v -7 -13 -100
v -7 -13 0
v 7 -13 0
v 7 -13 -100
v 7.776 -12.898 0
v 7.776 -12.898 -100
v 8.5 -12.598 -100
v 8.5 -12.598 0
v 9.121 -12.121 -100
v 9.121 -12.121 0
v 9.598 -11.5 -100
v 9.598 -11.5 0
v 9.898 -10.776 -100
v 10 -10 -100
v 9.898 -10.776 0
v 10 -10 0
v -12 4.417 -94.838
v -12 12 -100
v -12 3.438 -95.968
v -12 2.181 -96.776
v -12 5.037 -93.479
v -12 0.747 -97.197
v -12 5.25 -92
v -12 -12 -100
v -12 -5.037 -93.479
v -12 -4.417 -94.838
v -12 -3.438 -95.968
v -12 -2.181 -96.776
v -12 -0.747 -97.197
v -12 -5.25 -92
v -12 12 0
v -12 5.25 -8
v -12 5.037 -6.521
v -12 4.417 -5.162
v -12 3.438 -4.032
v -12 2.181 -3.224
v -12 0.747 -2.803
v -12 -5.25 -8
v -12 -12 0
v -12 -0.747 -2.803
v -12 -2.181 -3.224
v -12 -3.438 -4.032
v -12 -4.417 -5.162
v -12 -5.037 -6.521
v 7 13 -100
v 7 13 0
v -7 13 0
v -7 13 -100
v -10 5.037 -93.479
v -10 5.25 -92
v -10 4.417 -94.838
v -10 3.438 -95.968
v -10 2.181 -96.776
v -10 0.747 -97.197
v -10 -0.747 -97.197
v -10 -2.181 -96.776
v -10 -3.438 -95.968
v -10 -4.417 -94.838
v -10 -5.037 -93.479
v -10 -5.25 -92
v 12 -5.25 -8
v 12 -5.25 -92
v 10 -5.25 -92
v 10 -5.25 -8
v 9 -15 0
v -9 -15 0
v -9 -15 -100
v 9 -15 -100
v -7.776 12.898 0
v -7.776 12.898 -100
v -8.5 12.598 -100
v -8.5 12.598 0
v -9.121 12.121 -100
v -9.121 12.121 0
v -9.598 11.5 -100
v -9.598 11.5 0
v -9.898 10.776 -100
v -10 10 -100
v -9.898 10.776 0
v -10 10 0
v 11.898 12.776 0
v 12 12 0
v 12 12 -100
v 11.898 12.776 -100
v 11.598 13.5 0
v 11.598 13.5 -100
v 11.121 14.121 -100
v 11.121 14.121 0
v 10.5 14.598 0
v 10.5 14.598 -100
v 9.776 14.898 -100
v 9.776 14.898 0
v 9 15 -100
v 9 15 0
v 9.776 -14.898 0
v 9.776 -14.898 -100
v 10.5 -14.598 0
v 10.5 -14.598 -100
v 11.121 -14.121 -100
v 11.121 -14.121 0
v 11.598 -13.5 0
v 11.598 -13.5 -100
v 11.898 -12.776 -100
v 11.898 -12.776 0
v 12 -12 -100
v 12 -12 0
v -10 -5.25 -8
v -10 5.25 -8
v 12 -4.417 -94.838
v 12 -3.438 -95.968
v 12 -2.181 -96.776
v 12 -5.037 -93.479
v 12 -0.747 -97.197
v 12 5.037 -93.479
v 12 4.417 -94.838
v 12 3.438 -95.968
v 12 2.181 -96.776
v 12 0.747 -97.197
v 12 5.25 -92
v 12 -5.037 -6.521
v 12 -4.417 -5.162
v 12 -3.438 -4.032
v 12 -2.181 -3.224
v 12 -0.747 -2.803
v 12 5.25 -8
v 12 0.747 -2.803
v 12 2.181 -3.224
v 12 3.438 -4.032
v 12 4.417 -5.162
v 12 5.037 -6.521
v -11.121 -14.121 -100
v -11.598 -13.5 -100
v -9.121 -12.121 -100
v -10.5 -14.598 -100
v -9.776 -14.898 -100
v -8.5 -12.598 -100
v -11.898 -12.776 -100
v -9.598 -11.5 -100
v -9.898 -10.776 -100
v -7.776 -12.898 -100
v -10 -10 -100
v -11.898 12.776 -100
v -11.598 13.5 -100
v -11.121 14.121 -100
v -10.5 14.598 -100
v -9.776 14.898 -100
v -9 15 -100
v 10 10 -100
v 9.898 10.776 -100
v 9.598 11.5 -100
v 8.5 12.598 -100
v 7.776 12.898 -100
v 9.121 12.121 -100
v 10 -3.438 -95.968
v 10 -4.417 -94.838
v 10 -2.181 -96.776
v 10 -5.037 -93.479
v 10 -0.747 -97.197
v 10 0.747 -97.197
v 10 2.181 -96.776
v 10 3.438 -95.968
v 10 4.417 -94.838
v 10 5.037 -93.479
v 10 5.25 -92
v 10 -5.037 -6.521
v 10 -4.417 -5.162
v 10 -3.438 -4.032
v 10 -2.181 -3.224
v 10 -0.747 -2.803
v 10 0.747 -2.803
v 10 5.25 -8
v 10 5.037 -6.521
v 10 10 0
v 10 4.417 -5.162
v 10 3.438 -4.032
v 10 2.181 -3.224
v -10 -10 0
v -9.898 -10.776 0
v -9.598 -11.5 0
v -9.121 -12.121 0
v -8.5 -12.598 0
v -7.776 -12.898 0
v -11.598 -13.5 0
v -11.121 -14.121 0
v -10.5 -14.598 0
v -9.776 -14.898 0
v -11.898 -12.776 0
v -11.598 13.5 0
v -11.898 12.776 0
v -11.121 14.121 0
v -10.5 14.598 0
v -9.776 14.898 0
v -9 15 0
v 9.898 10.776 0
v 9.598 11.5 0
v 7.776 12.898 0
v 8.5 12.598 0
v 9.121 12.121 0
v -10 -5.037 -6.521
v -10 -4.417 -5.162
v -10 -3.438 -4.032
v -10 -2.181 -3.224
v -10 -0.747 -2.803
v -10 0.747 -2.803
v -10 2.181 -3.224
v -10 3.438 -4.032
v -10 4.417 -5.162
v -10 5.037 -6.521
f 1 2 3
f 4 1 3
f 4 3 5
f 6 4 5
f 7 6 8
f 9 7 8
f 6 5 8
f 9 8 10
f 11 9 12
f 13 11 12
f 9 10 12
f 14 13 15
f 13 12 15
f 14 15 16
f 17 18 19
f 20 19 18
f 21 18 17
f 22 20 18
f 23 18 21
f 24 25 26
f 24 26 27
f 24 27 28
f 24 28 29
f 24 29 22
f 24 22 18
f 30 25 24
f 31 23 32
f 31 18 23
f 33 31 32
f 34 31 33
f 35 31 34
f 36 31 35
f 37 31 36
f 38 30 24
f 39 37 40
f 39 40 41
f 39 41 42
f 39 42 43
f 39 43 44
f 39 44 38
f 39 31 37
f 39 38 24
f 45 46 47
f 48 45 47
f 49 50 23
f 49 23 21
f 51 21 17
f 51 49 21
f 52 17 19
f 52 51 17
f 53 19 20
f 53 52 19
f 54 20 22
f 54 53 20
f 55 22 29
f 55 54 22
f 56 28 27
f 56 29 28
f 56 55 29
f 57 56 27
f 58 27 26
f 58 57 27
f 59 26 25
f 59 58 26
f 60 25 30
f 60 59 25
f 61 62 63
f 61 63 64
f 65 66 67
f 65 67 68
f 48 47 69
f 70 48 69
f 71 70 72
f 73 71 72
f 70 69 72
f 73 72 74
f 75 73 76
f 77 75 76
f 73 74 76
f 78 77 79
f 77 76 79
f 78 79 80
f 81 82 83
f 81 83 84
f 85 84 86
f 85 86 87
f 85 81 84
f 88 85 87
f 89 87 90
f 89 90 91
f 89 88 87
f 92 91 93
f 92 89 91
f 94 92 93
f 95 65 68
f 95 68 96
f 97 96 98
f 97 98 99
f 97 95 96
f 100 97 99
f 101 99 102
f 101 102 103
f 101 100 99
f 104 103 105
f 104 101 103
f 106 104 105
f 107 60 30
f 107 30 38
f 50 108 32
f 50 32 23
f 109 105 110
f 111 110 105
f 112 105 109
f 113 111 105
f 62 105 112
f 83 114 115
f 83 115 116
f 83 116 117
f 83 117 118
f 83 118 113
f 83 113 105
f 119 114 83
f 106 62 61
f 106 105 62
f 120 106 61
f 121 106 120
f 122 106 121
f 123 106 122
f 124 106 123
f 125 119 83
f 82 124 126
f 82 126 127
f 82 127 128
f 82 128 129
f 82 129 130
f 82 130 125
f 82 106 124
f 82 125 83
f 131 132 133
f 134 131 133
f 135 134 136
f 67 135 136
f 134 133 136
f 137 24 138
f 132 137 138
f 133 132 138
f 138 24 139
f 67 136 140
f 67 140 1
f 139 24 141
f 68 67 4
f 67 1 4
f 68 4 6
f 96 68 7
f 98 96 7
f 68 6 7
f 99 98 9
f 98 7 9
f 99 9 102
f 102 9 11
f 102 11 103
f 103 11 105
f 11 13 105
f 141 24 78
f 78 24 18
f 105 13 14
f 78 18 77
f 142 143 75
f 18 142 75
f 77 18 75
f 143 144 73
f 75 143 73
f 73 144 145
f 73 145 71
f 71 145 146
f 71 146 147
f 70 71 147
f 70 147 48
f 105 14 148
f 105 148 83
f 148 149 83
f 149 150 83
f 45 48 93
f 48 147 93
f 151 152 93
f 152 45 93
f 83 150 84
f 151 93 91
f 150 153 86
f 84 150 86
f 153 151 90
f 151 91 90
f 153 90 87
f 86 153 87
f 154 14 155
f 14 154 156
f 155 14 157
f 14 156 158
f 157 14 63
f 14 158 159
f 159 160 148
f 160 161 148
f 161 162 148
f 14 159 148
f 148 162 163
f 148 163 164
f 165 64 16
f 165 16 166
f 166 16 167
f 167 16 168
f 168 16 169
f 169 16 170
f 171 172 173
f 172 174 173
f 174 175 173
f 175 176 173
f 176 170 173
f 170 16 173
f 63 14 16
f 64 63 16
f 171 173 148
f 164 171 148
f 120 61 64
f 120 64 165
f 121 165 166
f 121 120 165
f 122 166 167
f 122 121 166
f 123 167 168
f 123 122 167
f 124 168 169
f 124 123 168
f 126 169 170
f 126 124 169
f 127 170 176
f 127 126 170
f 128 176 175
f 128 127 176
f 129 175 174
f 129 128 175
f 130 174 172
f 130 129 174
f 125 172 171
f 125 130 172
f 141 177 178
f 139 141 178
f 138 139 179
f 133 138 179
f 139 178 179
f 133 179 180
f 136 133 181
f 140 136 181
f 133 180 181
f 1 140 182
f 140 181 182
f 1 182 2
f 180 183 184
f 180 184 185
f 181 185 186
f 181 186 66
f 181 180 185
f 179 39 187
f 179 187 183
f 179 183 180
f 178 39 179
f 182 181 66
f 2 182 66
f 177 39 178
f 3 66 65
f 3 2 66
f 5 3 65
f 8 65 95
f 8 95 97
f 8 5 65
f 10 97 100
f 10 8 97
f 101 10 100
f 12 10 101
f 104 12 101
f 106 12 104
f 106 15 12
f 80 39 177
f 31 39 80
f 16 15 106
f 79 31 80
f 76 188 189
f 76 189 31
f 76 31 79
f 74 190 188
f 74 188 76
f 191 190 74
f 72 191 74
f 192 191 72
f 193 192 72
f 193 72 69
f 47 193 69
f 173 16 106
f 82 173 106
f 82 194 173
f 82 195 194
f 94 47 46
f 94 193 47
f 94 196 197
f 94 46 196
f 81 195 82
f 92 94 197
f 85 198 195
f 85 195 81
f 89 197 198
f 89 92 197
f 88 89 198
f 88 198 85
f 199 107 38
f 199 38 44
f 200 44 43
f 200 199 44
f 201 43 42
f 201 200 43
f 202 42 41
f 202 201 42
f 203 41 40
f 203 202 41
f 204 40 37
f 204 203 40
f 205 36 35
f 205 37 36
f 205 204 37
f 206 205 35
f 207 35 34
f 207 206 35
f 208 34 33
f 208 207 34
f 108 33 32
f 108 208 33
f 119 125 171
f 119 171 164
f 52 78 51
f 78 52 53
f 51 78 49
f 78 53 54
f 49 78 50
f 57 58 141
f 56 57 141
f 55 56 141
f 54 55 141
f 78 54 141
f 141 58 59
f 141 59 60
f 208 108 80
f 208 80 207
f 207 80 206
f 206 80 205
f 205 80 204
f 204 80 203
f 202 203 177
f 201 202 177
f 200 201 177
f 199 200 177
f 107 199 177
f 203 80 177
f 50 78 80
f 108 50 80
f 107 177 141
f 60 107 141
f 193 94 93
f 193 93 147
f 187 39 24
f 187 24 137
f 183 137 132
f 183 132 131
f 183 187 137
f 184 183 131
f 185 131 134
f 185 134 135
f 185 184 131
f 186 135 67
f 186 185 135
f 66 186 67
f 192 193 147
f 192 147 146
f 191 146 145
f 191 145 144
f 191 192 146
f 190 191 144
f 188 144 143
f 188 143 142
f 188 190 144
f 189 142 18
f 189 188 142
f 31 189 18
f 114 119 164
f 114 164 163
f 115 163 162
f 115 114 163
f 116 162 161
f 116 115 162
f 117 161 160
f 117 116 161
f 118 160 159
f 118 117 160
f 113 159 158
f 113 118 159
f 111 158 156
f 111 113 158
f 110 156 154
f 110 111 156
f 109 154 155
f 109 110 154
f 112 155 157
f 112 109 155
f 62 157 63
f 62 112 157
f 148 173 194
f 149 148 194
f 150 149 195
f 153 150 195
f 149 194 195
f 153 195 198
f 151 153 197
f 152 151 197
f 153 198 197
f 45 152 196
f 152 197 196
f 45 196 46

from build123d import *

# Parameters (mm, degrees)
BOSS_EXTRU_1_DEPTH      = 100
ENL_V_MAT_EXTRU_1_DEPTH = 36


with BuildPart() as part:
    # Esquisse1 → Boss.-Extru.1 (new body)
    with BuildSketch(Plane.XY):
        with BuildLine():
            Line((-9, -15), (9, -15))
            ThreePointArc((9, -15), (11.121320344, -14.121320344), (12, -12))
            Line((12, -12), (12, 12))
            ThreePointArc((12, 12), (11.121320344, 14.121320344), (9, 15))
            Line((9, 15), (-9, 15))
            ThreePointArc((-9, 15), (-11.121320344, 14.121320344), (-12, 12))
            Line((-12, 12), (-12, -12))
            ThreePointArc((-12, -12), (-11.121320344, -14.121320344), (-9, -15))
        make_face()
        with BuildLine():
            Line((-7, -13), (7, -13))
            ThreePointArc((7, -13), (9.121320344, -12.121320344), (10, -10))
            Line((10, -10), (10, 10))
            ThreePointArc((10, 10), (9.121320344, 12.121320344), (7, 13))
            Line((7, 13), (-7, 13))
            ThreePointArc((-7, 13), (-9.121320344, 12.121320344), (-10, 10))
            Line((-10, 10), (-10, -10))
            ThreePointArc((-10, -10), (-9.121320344, -12.121320344), (-7, -13))
        make_face(mode=Mode.SUBTRACT)
    extrude(amount=-BOSS_EXTRU_1_DEPTH)

    # Esquisse2 → Enlèv. mat.-Extru.1 (cut)
    with BuildSketch(Plane(origin=(12, 0, 0), x_dir=(0, 0, -1), z_dir=(1, 0, 0))):
        with BuildLine():
            Line((92, -5.25), (8, -5.25))
            ThreePointArc((8, -5.25), (2.75, 0), (8, 5.25))
            Line((8, 5.25), (92, 5.25))
            ThreePointArc((92, 5.25), (97.25, 0), (92, -5.25))
        make_face()
    extrude(amount=-ENL_V_MAT_EXTRU_1_DEPTH, mode=Mode.SUBTRACT)


solid = part.part
